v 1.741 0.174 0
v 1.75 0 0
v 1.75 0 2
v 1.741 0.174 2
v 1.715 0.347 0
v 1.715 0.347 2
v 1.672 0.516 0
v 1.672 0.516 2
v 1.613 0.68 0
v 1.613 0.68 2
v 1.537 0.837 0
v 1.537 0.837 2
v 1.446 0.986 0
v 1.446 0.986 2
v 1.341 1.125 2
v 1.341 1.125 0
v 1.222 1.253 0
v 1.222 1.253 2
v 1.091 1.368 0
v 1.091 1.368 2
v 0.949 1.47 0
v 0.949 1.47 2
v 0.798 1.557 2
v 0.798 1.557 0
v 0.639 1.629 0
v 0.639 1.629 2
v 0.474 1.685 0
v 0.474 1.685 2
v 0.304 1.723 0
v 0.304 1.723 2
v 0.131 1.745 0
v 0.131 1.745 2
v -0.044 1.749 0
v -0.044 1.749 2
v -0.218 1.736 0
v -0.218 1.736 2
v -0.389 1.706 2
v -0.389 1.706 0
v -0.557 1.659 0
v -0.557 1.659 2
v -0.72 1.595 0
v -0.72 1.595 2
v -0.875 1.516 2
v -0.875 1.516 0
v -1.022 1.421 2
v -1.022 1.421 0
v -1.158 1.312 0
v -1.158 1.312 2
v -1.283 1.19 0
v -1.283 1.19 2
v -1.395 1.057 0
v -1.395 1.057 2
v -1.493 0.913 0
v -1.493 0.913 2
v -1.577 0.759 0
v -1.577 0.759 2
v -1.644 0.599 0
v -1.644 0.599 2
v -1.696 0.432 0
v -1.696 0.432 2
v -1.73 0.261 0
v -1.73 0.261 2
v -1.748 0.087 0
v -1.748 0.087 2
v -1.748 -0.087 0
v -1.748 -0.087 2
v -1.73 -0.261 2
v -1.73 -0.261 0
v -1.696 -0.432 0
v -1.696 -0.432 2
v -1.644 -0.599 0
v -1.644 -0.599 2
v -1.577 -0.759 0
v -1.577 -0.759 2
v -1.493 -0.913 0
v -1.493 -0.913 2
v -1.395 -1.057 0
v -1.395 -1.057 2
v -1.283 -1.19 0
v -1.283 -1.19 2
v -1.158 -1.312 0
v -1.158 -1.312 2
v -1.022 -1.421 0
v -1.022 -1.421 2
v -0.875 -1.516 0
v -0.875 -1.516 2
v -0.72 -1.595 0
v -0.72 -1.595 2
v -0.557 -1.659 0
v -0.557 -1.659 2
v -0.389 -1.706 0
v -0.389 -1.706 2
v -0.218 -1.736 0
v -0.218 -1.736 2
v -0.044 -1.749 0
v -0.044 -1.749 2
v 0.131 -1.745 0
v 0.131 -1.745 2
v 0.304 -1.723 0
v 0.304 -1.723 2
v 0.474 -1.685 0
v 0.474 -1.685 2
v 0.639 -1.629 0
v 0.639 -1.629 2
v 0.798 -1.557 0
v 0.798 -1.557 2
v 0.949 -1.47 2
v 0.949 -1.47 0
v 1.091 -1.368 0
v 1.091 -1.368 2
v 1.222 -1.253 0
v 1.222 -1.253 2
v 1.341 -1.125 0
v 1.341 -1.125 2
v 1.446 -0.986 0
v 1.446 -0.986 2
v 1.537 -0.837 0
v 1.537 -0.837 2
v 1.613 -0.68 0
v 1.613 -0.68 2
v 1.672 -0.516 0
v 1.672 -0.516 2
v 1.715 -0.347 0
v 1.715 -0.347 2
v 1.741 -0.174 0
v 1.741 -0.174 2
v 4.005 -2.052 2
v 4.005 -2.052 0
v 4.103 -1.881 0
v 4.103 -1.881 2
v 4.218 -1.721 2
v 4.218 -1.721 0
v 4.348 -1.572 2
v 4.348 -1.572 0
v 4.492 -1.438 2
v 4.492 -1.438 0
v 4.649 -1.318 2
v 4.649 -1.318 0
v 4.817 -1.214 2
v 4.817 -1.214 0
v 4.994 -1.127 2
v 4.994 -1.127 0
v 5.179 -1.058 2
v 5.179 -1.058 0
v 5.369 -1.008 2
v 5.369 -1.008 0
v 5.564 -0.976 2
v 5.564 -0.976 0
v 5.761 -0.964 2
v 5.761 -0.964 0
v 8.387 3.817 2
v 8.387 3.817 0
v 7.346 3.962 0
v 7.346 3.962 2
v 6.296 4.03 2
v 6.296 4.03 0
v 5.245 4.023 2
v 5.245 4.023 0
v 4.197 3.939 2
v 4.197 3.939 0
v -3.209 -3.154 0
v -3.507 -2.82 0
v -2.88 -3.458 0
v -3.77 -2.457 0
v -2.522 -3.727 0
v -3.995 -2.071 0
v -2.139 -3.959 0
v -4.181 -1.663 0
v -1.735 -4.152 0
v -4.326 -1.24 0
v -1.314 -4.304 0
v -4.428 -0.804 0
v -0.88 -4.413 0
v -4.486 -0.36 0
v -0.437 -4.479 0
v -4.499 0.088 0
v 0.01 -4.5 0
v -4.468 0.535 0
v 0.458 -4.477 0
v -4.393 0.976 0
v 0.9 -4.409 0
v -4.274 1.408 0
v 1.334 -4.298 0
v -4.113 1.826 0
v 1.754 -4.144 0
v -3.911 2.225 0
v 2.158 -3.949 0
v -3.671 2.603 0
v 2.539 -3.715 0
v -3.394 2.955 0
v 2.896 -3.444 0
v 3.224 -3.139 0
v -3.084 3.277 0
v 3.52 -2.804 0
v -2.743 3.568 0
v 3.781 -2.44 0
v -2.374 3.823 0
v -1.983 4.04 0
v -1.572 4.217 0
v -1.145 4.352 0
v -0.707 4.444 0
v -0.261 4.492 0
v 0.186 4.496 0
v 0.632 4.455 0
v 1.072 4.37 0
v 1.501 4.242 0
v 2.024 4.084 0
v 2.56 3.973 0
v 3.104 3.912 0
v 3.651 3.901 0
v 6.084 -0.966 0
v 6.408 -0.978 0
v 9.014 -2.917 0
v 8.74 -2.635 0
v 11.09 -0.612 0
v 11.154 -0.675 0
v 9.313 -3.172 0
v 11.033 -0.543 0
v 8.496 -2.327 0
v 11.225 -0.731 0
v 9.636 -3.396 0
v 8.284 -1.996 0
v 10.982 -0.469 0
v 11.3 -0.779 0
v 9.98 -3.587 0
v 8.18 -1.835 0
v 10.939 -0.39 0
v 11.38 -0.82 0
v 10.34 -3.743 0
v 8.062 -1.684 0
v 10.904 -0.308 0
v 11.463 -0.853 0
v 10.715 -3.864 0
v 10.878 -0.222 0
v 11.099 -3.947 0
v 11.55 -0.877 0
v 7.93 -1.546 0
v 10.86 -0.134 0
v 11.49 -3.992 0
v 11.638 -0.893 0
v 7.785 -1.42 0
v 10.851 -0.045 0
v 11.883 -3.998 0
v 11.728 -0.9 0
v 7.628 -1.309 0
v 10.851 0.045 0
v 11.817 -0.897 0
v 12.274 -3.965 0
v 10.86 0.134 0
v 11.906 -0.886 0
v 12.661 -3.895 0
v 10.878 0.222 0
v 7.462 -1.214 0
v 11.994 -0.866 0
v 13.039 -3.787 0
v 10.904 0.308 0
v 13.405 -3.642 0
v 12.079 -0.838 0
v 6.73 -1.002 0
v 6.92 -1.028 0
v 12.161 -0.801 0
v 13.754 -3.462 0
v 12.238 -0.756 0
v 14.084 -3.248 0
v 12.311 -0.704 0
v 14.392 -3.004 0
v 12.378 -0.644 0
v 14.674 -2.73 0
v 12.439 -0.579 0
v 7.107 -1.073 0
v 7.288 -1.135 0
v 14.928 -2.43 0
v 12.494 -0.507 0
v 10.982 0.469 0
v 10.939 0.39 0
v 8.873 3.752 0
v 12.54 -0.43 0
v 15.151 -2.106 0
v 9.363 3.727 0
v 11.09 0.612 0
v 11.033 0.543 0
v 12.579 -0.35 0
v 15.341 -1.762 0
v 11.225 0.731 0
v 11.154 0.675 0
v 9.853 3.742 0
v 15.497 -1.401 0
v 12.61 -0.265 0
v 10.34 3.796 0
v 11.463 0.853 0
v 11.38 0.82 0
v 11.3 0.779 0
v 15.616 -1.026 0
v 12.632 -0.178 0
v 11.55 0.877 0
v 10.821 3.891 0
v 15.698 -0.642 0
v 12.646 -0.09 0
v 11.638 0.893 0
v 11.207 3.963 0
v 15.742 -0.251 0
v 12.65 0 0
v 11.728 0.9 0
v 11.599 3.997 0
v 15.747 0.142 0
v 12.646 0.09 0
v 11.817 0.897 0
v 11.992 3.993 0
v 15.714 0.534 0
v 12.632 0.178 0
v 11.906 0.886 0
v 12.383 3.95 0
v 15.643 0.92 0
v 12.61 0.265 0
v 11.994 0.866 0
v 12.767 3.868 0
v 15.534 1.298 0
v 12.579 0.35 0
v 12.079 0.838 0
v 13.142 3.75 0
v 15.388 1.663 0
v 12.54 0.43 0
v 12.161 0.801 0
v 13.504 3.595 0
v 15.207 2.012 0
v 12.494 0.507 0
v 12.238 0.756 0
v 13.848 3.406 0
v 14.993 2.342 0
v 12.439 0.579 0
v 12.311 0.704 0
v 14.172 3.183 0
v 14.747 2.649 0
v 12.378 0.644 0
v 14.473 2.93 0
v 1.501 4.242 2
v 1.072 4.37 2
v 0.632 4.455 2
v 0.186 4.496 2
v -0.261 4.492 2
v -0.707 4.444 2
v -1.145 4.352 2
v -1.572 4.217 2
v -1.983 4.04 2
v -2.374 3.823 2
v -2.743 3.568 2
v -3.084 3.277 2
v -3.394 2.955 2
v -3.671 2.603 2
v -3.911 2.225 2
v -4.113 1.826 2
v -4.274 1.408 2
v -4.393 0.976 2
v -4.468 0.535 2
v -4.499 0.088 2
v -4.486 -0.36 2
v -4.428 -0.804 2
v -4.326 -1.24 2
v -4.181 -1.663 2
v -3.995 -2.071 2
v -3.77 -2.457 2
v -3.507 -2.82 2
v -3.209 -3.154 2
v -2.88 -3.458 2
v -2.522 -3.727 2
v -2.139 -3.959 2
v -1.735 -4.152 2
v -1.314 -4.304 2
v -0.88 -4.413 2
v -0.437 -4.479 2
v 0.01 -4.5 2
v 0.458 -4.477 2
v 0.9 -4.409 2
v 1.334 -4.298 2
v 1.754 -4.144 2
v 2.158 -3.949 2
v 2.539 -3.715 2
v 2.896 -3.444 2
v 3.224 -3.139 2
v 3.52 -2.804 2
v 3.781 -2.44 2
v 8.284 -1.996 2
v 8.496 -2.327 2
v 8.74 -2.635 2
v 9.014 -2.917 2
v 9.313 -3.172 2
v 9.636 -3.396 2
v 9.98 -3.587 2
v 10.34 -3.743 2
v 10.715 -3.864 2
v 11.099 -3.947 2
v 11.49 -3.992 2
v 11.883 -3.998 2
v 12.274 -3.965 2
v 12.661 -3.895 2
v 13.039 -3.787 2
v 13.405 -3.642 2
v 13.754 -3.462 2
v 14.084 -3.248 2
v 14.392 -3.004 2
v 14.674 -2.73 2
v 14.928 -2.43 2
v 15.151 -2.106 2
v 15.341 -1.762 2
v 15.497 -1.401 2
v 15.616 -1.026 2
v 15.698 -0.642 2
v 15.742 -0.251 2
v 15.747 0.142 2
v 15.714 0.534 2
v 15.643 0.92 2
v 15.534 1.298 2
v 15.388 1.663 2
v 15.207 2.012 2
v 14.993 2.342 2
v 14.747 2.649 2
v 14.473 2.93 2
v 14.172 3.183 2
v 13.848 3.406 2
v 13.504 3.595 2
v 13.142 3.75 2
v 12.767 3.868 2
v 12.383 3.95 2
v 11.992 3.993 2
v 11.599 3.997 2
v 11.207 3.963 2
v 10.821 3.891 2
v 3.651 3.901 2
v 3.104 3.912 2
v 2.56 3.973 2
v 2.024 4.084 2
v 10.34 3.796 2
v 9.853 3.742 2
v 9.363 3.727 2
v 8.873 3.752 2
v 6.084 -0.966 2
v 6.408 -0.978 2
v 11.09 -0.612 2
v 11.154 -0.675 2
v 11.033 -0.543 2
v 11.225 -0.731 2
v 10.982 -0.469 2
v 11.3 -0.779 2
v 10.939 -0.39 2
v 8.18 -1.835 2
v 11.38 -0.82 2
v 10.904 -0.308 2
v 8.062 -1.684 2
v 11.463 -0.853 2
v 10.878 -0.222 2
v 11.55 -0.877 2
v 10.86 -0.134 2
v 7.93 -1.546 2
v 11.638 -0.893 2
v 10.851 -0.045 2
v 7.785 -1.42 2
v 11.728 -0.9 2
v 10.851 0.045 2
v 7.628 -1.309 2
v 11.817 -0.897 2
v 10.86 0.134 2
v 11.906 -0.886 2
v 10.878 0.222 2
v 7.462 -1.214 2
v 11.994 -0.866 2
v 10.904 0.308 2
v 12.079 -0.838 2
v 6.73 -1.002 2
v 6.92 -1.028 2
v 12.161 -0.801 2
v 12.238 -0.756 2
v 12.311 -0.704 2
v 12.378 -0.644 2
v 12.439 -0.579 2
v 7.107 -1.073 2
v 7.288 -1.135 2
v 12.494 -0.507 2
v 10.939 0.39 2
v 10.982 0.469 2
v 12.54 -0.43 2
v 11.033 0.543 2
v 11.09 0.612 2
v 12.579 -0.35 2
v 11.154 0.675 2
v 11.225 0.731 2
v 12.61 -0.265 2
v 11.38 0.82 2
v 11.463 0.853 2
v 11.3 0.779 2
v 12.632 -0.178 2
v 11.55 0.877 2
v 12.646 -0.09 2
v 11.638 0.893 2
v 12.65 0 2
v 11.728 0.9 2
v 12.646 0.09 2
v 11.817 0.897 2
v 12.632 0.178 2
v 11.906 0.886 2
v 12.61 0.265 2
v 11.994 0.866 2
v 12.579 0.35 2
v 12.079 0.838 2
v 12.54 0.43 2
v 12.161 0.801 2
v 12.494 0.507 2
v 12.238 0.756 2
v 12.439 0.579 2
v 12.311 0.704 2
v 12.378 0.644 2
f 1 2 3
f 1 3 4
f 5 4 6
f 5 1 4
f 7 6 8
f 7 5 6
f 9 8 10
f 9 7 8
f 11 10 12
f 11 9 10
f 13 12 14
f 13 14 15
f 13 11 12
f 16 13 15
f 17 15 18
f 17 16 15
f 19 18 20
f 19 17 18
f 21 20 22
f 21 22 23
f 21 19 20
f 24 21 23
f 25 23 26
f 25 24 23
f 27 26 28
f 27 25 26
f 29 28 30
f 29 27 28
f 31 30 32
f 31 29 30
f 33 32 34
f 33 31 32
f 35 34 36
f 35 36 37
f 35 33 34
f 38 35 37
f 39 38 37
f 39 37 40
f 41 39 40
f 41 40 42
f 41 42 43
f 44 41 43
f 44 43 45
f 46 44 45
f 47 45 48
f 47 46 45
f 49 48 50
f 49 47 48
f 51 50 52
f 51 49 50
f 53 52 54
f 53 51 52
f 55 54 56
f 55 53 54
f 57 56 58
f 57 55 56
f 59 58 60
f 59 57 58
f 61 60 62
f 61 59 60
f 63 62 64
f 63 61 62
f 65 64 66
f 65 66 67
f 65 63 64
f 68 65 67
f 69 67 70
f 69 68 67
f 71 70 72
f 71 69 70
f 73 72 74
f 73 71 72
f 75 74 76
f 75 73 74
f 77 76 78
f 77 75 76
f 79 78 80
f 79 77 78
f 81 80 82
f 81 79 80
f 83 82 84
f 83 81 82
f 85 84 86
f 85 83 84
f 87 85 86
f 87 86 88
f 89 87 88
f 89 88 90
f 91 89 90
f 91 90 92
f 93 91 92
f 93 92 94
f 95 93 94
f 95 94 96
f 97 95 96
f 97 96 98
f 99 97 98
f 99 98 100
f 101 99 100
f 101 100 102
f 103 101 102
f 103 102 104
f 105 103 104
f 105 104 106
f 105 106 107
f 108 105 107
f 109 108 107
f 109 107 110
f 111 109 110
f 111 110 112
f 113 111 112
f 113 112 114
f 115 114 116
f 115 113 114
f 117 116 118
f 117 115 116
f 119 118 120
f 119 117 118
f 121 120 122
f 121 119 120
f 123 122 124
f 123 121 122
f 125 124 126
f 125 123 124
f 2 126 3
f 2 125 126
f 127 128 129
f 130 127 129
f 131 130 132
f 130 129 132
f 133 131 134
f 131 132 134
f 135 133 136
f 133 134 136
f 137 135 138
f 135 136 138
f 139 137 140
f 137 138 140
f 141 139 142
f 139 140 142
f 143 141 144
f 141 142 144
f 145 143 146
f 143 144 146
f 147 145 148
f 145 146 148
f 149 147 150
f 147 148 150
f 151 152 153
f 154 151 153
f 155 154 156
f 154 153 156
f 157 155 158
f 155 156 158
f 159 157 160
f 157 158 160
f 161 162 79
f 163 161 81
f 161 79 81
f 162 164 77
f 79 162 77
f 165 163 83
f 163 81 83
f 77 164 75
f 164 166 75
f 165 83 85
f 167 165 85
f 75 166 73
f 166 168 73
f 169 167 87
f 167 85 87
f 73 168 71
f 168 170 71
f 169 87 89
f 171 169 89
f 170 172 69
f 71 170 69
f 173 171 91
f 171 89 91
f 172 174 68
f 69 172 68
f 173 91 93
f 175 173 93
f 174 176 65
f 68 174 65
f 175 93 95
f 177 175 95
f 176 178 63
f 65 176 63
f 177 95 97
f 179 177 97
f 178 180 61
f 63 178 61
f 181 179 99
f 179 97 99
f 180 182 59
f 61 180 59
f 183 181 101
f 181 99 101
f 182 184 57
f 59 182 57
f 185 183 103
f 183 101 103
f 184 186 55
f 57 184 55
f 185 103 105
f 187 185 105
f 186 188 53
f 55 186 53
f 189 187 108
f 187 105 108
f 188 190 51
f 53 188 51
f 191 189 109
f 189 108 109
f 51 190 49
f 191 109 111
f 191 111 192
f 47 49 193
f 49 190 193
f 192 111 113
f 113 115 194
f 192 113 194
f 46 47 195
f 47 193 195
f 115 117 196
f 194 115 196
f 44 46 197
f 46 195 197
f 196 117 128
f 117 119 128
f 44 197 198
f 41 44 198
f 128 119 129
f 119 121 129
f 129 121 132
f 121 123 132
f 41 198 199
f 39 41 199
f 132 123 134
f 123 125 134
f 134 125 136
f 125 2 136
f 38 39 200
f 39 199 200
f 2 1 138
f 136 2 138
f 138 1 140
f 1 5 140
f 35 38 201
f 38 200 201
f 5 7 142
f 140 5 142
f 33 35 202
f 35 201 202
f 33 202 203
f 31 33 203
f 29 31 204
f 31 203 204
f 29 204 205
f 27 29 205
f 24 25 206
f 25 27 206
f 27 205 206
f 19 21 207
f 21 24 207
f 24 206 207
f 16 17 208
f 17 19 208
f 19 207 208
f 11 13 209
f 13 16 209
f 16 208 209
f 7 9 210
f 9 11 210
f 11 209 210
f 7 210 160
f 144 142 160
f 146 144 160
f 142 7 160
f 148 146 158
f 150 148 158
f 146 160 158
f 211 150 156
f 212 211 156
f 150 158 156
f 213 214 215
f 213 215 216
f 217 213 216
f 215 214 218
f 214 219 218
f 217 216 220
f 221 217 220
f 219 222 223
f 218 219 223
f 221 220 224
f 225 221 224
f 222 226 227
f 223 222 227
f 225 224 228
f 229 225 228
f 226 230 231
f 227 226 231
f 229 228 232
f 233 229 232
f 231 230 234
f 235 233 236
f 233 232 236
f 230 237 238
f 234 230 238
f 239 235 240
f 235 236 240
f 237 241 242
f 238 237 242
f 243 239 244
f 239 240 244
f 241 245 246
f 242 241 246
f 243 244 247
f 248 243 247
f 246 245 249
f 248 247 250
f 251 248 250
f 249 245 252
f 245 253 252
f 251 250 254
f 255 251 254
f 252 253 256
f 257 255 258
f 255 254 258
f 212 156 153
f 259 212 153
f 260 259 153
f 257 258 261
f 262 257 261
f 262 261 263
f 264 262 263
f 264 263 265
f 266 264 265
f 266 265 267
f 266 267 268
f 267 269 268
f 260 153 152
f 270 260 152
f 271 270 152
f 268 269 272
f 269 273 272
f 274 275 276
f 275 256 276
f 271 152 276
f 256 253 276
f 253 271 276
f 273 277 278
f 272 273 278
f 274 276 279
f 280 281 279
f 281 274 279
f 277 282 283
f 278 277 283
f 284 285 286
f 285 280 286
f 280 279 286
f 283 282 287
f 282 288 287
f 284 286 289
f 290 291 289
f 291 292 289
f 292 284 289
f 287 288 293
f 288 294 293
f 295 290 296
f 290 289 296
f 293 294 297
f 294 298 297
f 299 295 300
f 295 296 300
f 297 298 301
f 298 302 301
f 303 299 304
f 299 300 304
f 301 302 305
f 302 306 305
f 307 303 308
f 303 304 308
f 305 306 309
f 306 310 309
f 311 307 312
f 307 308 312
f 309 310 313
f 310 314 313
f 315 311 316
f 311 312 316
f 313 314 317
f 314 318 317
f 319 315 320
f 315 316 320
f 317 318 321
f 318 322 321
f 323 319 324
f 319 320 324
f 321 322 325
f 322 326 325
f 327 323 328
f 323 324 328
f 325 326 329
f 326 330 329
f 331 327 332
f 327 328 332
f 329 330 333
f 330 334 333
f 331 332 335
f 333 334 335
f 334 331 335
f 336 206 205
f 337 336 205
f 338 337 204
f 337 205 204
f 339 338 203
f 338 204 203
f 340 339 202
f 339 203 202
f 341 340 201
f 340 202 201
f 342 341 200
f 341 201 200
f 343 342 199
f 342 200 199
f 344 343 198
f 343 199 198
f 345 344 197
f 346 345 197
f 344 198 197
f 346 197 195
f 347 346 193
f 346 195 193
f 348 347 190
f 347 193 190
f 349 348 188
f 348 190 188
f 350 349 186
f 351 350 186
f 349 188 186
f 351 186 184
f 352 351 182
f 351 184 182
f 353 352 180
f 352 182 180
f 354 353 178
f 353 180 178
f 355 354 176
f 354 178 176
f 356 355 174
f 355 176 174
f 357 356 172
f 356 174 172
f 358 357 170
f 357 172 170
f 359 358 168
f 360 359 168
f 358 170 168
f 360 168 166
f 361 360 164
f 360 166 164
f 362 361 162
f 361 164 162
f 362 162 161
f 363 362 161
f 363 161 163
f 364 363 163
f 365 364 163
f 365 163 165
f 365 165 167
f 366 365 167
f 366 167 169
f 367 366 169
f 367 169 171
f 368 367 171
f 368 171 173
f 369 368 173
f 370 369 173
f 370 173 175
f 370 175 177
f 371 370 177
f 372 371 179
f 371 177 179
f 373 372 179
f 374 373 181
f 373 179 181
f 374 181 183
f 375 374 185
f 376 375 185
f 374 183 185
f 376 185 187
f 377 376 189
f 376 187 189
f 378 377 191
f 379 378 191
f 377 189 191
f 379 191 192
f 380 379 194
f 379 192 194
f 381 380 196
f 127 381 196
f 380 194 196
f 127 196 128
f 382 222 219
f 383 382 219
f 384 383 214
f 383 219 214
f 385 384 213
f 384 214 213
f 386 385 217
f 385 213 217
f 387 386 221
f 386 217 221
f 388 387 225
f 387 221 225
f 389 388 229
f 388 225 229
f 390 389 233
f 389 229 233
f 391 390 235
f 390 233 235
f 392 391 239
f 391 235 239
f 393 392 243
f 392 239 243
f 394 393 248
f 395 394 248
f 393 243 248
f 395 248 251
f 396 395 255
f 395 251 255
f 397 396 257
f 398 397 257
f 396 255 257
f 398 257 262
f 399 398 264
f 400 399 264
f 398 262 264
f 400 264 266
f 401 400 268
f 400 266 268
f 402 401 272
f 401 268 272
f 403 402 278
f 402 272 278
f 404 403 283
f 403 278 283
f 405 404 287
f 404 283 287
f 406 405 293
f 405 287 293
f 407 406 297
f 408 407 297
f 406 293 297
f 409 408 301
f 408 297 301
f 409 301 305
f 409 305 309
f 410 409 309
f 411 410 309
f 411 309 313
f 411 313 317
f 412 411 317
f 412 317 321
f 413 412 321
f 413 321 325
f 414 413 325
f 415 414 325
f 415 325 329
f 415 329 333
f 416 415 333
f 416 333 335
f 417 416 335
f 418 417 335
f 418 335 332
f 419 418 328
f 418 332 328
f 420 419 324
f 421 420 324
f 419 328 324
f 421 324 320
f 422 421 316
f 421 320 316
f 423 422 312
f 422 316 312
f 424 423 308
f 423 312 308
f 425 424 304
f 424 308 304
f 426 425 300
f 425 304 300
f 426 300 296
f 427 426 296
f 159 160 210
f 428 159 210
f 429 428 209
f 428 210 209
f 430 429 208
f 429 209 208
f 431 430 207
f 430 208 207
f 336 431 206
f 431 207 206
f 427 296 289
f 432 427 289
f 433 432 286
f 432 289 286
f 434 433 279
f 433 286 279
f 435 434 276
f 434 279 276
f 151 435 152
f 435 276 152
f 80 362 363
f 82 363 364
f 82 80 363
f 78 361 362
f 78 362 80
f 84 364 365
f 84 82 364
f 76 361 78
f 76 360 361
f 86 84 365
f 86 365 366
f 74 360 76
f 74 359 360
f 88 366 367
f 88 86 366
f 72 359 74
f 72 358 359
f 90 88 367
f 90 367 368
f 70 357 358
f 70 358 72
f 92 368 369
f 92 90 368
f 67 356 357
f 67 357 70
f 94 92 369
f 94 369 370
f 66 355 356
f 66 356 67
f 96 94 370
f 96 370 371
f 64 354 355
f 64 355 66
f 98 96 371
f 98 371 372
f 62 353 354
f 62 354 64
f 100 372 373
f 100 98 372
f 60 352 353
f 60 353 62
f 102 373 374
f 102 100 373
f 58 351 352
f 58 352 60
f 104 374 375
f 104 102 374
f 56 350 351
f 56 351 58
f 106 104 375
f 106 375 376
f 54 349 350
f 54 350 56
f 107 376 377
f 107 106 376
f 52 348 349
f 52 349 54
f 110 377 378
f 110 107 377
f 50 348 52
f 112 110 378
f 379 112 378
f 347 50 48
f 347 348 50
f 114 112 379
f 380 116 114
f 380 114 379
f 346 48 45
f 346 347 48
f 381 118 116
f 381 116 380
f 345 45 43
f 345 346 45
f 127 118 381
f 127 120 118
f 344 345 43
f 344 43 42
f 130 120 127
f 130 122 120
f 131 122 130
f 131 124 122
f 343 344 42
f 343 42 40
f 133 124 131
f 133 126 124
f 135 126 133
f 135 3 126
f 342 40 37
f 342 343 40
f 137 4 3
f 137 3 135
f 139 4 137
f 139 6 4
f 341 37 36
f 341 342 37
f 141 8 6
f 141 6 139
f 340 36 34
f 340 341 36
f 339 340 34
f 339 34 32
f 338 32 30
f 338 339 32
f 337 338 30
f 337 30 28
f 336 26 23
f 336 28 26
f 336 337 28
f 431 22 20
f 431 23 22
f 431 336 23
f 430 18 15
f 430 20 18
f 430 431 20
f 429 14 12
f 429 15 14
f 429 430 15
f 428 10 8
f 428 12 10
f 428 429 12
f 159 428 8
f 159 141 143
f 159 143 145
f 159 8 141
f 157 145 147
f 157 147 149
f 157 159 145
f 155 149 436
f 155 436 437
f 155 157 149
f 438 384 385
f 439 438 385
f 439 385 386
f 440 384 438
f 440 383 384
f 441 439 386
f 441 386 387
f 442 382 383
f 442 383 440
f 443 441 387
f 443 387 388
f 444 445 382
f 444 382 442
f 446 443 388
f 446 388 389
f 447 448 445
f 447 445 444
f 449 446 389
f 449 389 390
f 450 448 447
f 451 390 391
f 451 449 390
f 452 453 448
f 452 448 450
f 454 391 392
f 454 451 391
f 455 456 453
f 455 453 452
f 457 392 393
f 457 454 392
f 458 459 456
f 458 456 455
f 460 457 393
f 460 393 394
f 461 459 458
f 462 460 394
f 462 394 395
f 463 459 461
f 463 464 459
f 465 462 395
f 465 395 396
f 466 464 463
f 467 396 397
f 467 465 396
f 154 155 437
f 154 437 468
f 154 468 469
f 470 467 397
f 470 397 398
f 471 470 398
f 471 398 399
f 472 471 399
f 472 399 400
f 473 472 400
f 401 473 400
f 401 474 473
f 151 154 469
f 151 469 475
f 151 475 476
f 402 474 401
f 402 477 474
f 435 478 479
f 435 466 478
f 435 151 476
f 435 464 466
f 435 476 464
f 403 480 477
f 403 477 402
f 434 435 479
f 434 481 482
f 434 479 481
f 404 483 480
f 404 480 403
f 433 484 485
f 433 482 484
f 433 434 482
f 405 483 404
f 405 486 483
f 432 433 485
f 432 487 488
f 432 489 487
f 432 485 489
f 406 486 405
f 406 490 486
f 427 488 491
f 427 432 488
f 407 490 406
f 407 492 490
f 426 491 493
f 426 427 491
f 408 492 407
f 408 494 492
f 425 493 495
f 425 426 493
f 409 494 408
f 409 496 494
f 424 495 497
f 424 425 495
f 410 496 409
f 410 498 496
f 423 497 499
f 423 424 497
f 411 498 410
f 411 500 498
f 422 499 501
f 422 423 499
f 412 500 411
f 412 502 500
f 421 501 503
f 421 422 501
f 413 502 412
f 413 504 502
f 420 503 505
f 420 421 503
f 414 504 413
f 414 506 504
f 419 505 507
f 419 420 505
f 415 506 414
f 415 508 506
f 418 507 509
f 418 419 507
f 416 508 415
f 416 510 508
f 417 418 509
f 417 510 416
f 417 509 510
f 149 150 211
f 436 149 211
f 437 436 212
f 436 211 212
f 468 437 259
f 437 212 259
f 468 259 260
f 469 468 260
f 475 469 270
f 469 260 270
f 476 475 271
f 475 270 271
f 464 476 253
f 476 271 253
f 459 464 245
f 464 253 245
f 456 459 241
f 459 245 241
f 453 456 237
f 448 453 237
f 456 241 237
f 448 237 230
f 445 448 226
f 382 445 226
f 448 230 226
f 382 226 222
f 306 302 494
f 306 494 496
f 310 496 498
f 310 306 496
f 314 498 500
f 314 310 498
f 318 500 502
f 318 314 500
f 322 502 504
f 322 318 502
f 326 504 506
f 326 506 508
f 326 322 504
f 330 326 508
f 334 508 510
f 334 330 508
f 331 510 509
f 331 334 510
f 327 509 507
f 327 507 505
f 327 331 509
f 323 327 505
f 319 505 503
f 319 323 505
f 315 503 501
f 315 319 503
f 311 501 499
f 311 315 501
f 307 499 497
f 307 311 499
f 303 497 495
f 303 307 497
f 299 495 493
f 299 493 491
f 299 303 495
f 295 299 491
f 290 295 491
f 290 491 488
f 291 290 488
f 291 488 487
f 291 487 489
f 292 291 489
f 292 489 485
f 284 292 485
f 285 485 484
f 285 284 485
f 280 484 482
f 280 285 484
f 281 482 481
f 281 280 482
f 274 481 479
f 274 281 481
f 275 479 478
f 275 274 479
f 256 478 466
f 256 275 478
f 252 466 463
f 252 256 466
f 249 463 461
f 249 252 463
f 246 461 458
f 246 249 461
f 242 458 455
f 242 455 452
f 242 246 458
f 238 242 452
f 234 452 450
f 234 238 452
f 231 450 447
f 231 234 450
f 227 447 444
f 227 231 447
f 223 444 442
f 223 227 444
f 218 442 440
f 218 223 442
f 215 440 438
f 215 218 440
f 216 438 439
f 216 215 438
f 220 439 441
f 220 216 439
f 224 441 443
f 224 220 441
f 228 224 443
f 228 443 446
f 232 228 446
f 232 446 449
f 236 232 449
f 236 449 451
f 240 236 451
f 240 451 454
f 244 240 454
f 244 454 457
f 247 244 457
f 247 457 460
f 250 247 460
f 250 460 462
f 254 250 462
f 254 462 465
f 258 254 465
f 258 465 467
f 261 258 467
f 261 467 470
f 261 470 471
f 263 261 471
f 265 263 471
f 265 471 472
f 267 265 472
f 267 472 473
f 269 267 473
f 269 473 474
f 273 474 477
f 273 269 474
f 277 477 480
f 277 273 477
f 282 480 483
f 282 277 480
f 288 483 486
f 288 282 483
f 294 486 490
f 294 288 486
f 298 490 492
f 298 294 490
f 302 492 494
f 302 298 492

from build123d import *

# Parameters (mm, degrees)
SKETCH1_R           = 1.75
SKETCH1_R_2         = 0.9
BOSS_EXTRUDE1_DEPTH = 2


with BuildPart() as part:
    # Sketch1 → Boss-Extrude1 (new body)
    with BuildSketch(Plane.XY):
        with BuildLine():
            ThreePointArc((1.50092417, 4.24231383), (-4.181288107, -1.663379022), (4.004901939, -2.052013757))
            ThreePointArc((4.004901939, -2.052013757), (4.731552678, -1.263858953), (5.760820585, -0.96416433))
            ThreePointArc((5.760820585, -0.96416433), (6.246121173, -0.970729914), (6.730453105, -1.002072336))
            ThreePointArc((6.730453105, -1.002072336), (7.628385483, -1.309353486), (8.28357181, -1.995964829))
            ThreePointArc((8.28357181, -1.995964829), (15.423311106, -1.583283146), (10.820810187, 3.890579172))
            ThreePointArc((10.820810187, 3.890579172), (9.607869973, 3.729173943), (8.387408257, 3.817201272))
            ThreePointArc((8.387408257, 3.817201272), (6.296455304, 4.03039557), (4.196647208, 3.939060928))
            ThreePointArc((4.196647208, 3.939060928), (2.831422573, 3.936340457), (1.50092417, 4.24231383))
        make_face()
        Circle(SKETCH1_R, mode=Mode.SUBTRACT)
        with Locations((11.75, 0)):
            Circle(SKETCH1_R_2, mode=Mode.SUBTRACT)
    extrude(amount=BOSS_EXTRUDE1_DEPTH)


solid = part.part
